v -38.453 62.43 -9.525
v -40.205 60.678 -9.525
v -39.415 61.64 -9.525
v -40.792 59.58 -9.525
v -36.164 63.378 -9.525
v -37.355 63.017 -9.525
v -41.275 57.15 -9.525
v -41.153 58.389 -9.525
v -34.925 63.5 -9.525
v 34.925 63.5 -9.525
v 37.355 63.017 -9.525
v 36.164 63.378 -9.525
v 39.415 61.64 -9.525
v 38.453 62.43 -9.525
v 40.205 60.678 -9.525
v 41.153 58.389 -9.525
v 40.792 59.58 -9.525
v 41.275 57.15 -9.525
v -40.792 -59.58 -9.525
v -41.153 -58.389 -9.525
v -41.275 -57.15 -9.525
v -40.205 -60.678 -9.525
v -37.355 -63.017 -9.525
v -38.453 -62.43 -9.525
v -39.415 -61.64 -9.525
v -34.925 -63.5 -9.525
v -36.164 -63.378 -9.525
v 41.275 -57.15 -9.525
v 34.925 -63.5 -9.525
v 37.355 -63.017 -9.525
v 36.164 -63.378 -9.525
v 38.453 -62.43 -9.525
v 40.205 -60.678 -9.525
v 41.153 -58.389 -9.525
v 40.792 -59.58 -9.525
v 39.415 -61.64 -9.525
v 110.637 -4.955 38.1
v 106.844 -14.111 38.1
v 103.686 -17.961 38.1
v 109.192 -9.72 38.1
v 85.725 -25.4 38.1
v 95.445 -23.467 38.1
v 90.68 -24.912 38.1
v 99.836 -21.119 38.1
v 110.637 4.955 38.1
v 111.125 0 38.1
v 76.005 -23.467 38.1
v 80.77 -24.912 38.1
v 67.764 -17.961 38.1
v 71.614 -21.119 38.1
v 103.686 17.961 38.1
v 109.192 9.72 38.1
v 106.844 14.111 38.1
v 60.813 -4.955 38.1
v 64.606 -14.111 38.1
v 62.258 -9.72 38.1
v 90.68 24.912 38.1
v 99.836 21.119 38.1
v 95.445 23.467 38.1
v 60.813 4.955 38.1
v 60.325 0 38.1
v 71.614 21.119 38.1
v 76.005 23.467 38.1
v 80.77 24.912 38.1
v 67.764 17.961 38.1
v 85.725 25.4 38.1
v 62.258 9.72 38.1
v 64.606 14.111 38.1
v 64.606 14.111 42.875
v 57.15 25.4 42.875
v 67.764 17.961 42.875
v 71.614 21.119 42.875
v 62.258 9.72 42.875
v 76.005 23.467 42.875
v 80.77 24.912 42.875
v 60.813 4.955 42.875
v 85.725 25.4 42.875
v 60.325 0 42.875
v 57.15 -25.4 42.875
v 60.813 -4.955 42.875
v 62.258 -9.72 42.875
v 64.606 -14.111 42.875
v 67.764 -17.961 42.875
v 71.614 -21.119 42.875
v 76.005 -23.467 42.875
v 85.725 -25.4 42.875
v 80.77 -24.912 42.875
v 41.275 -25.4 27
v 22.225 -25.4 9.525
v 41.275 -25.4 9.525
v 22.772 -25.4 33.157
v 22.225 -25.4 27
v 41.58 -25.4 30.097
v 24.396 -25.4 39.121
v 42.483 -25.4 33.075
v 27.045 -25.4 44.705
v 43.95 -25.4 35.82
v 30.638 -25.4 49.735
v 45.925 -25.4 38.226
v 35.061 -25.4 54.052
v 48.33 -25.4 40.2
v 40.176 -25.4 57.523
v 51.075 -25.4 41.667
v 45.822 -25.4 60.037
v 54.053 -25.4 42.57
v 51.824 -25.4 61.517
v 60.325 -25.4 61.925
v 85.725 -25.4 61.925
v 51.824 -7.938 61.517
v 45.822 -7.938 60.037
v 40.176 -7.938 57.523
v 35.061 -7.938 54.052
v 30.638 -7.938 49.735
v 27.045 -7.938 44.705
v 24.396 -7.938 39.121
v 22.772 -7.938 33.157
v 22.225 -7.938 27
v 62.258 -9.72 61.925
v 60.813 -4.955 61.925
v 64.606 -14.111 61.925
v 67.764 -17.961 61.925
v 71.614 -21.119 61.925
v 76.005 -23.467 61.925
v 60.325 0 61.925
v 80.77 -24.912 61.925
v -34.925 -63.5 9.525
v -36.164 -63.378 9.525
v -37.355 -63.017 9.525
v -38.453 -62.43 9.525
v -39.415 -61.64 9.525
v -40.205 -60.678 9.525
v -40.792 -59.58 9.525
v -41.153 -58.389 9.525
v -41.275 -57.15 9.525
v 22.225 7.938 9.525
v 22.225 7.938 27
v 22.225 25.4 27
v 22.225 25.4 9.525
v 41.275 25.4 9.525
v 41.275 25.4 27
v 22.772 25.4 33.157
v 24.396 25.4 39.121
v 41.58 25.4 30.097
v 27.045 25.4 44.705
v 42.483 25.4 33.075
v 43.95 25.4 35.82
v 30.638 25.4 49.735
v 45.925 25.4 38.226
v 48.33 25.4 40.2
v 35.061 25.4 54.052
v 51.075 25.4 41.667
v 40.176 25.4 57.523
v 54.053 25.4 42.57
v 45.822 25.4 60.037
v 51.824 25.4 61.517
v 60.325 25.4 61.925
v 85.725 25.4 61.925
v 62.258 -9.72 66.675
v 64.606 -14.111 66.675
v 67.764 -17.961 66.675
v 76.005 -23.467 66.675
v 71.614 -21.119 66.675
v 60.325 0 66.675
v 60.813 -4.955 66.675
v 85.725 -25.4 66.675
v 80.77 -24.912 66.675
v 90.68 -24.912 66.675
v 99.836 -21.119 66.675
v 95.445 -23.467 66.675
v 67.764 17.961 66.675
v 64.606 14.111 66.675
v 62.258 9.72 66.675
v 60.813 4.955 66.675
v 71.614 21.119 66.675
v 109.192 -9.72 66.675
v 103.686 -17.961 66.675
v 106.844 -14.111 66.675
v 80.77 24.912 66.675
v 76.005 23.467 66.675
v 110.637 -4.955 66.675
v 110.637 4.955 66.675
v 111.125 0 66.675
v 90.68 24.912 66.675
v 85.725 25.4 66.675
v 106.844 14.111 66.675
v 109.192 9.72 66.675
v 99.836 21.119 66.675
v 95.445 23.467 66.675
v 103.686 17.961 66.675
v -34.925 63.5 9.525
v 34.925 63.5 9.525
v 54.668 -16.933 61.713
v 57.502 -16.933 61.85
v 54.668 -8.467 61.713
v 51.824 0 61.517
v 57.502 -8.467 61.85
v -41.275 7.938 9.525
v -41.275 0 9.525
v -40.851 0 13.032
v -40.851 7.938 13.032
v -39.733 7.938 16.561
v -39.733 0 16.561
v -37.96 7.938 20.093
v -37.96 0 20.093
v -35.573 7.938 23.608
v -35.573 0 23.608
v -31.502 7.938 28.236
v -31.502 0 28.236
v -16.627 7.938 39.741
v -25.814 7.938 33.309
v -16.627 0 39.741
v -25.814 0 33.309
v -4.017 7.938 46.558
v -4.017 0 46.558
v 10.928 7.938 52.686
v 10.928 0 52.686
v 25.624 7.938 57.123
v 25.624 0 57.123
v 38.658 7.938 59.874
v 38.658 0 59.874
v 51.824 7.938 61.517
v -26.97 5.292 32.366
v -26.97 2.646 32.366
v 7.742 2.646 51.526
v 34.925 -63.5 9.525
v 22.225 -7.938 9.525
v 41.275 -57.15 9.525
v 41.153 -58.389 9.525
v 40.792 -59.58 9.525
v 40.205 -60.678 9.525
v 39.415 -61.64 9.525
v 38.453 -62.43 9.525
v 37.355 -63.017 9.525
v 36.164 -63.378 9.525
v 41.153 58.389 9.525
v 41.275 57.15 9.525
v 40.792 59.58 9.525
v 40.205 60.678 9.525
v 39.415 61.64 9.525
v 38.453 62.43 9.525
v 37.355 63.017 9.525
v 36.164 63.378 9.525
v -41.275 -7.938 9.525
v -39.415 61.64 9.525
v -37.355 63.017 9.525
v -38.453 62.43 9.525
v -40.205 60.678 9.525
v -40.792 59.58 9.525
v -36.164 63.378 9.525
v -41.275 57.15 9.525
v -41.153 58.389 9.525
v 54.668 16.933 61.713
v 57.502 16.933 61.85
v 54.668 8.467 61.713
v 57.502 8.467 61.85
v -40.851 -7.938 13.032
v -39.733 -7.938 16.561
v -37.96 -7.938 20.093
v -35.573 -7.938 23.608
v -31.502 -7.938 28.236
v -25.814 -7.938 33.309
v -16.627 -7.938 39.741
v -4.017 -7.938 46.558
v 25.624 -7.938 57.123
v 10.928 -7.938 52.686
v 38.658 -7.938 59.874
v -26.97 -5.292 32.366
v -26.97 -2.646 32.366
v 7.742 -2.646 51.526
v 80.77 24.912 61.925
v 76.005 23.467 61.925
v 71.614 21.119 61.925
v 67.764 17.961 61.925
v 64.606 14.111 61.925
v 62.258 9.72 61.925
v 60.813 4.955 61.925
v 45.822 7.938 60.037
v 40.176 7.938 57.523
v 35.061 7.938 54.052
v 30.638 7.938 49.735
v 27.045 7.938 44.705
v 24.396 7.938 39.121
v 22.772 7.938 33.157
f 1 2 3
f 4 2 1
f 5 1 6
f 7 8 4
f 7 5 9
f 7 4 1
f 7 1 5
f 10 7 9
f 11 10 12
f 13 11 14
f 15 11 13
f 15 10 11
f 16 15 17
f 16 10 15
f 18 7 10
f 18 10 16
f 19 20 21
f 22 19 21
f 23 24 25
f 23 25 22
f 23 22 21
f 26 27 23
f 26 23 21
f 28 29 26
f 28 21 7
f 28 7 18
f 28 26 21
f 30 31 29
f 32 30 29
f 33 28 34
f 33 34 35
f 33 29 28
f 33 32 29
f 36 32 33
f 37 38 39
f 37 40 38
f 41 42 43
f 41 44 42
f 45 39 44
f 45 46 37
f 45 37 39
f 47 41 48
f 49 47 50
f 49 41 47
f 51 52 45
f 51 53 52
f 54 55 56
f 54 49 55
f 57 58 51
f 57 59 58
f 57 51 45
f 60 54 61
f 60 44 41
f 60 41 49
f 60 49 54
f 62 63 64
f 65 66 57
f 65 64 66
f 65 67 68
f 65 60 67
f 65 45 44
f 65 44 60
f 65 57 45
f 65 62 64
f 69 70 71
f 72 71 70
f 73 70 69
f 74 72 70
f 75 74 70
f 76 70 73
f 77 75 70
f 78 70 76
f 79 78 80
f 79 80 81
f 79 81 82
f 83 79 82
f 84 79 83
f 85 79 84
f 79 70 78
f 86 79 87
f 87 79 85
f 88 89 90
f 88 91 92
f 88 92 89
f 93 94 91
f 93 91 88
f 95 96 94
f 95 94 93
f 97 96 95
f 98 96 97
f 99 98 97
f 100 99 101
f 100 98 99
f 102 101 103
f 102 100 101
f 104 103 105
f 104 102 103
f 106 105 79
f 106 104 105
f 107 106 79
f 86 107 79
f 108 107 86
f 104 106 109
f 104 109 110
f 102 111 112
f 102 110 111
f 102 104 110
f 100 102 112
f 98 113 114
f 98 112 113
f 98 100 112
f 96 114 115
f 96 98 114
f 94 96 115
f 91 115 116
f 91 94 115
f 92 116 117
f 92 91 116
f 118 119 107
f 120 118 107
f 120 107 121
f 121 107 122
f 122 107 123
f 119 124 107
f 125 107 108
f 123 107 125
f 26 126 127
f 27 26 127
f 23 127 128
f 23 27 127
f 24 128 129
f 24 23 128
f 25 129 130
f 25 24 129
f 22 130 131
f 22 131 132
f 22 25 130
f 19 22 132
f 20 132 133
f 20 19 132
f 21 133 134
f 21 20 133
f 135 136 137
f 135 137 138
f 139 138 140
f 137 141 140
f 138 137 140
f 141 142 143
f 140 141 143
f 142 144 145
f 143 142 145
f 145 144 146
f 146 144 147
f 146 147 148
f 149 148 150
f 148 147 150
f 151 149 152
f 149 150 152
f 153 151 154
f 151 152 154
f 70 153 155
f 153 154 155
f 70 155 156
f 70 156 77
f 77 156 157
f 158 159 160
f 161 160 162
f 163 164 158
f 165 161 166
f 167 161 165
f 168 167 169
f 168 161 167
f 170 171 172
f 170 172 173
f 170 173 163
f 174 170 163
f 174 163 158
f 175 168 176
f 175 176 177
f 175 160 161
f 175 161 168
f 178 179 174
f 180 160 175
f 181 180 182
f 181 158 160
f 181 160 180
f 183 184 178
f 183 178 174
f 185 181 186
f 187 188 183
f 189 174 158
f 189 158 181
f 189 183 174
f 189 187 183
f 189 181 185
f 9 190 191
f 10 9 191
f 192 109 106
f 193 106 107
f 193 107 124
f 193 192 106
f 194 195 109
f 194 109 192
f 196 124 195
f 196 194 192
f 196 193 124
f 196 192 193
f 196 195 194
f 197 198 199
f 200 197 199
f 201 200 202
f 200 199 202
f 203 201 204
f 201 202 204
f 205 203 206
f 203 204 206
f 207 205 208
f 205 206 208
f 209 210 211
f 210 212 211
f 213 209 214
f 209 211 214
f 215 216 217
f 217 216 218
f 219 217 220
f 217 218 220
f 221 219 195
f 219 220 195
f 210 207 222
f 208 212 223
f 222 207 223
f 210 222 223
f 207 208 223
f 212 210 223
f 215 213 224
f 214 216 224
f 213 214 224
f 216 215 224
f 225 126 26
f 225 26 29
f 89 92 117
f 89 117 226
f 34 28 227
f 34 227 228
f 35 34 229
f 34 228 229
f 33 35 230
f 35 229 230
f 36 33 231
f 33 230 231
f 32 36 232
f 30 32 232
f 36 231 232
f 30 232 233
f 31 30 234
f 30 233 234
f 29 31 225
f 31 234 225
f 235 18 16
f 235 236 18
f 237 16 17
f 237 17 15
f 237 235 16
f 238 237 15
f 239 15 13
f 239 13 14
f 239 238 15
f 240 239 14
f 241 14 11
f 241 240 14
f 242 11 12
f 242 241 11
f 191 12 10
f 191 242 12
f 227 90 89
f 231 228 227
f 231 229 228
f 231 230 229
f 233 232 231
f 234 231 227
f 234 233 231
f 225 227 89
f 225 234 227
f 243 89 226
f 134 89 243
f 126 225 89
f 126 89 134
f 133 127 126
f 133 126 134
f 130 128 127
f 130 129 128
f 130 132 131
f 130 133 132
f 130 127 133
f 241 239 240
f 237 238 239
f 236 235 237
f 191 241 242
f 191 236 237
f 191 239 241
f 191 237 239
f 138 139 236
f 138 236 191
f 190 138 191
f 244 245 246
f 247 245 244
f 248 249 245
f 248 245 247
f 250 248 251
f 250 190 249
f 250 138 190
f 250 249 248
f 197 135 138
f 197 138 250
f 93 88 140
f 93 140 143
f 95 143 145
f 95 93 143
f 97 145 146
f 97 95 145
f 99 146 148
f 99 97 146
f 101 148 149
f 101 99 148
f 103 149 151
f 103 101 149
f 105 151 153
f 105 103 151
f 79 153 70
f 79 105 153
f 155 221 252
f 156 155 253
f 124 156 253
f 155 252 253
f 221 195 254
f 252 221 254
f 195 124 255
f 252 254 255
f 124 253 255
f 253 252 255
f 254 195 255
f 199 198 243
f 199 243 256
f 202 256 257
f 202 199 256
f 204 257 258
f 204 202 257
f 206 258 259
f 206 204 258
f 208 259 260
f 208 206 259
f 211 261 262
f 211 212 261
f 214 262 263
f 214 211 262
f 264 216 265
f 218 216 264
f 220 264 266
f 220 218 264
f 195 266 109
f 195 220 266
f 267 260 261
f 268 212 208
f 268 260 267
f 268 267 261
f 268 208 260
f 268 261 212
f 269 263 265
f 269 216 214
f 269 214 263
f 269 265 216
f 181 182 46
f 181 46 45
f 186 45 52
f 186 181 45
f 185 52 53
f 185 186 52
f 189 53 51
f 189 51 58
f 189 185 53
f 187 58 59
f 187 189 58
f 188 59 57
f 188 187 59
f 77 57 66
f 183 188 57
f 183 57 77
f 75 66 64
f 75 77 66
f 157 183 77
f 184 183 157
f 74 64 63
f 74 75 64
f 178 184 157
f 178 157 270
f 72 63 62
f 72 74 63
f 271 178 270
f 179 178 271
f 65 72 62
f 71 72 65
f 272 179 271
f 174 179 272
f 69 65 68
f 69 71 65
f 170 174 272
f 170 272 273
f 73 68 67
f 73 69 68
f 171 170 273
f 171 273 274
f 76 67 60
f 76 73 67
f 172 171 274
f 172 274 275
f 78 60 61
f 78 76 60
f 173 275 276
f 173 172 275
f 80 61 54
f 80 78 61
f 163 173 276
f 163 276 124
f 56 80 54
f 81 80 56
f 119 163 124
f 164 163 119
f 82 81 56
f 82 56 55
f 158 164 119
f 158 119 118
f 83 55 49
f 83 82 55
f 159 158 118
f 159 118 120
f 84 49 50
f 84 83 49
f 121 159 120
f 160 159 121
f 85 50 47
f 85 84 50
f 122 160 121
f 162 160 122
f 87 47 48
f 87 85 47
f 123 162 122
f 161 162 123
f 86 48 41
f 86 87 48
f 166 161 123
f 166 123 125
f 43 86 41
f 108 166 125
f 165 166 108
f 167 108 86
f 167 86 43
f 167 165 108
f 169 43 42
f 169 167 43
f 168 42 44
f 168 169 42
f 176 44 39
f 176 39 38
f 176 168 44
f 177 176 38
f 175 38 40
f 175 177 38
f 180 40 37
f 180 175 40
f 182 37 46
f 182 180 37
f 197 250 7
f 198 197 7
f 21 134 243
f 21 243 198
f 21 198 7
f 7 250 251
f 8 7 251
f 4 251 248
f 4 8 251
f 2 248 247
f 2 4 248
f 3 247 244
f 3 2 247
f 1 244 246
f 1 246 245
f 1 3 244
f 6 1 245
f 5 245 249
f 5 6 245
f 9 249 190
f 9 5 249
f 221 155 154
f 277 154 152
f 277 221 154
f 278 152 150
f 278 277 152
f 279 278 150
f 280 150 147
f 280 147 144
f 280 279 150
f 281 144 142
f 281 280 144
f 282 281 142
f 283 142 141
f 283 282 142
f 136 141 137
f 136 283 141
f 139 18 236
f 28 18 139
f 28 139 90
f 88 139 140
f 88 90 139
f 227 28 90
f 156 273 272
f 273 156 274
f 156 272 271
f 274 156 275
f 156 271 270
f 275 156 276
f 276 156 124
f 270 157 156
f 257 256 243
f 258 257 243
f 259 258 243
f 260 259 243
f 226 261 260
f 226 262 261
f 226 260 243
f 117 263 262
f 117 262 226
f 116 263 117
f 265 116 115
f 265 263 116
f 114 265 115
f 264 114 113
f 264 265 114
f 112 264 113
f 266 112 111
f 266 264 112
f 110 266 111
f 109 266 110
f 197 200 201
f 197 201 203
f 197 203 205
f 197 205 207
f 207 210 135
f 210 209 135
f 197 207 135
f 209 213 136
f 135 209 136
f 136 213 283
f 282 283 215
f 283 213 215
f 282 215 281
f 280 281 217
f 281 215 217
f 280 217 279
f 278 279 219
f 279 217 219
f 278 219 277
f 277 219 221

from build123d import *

# Parameters (mm, degrees)
F1_DEPTH = 63.5
F0_W     = 25.4
F0_H     = 19.05
F2_DEPTH = 25.4
F3_DEPTH = 7.9375
F5_R     = 6.35


with BuildPart() as f1:
    # F0 (on Front) → F1 (new body, symmetric)
    with BuildSketch(Plane.XZ):
        Polygon((41.275, -9.525), (41.275, 9.525), (22.225, 9.525), (-41.275, 9.525), (-41.275, -9.525), align=None)
    extrude(amount=F1_DEPTH, both=True)

    # F0 (on Front) → F2 (join, symmetric)
    with BuildSketch(Plane.XZ):
        with BuildLine():
            Line((22.225, 9.525), (41.275, 9.525))
            Line((41.275, 9.525), (41.275, 27.0002))
            ThreePointArc((41.275, 27.0002), (45.92468, 38.22552), (57.15, 42.8752))
            Line((57.15, 42.8752), (60.325, 42.8752))
            Line((60.325, 42.8752), (60.325, 61.9252))
            add(Edge.make_bspline(
                [(51.823545, 61.516638), (54.671503, 61.742605), (57.509493, 61.880867), (60.325, 61.9252)],
                knots=[107.525137, 107.525137, 107.525137, 107.525137, 114.316845, 114.316845, 114.316845, 114.316845], degree=3))
            ThreePointArc((51.823545, 61.516638), (30.637908, 49.734856), (22.225, 27.0002))
            Line((22.225, 27.0002), (22.225, 9.525))
        make_face()
        with Locations((73.025, 52.4002)):
            Rectangle(F0_W, F0_H)
    extrude(amount=F2_DEPTH, both=True)

    # F0 (on Front) → F3 (join, symmetric)
    with BuildSketch(Plane.XZ):
        with BuildLine():
            Line((-41.275, 9.525), (22.225, 9.525))
            Line((22.225, 9.525), (22.225, 27.0002))
            ThreePointArc((22.225, 27.0002), (30.637908, 49.734856), (51.823545, 61.516638))
            add(Edge.make_bspline(
                [(-41.275, 9.525), (-40.851534, 32.378485), (6.735176, 57.939164), (51.823545, 61.516638)],
                knots=[0, 0, 0, 0, 107.525137, 107.525137, 107.525137, 107.525137], degree=3))
        make_face()
    extrude(amount=F3_DEPTH, both=True)

    # F0 (on Front) → F4 (revolve)
    with BuildSketch(Plane.XZ):
        Polygon((85.725, 61.9252), (85.725, 42.8752), (85.725, 38.1), (111.125, 38.1), (111.125, 66.675), (85.725, 66.675), align=None)
    revolve(axis=Axis((85.725, 0, 52.3875), (0, 0, 1)))

    # F5
    f5_edges = [f1.edges().sort_by_distance(p)[0] for p in [
        (41.275, -63.5, 0),
        (-41.275, -63.5, 0),
        (41.275, 63.5, 0),
        (-41.275, 63.5, 0),
    ]]
    fillet(f5_edges, radius=F5_R)


solid = f1.part
